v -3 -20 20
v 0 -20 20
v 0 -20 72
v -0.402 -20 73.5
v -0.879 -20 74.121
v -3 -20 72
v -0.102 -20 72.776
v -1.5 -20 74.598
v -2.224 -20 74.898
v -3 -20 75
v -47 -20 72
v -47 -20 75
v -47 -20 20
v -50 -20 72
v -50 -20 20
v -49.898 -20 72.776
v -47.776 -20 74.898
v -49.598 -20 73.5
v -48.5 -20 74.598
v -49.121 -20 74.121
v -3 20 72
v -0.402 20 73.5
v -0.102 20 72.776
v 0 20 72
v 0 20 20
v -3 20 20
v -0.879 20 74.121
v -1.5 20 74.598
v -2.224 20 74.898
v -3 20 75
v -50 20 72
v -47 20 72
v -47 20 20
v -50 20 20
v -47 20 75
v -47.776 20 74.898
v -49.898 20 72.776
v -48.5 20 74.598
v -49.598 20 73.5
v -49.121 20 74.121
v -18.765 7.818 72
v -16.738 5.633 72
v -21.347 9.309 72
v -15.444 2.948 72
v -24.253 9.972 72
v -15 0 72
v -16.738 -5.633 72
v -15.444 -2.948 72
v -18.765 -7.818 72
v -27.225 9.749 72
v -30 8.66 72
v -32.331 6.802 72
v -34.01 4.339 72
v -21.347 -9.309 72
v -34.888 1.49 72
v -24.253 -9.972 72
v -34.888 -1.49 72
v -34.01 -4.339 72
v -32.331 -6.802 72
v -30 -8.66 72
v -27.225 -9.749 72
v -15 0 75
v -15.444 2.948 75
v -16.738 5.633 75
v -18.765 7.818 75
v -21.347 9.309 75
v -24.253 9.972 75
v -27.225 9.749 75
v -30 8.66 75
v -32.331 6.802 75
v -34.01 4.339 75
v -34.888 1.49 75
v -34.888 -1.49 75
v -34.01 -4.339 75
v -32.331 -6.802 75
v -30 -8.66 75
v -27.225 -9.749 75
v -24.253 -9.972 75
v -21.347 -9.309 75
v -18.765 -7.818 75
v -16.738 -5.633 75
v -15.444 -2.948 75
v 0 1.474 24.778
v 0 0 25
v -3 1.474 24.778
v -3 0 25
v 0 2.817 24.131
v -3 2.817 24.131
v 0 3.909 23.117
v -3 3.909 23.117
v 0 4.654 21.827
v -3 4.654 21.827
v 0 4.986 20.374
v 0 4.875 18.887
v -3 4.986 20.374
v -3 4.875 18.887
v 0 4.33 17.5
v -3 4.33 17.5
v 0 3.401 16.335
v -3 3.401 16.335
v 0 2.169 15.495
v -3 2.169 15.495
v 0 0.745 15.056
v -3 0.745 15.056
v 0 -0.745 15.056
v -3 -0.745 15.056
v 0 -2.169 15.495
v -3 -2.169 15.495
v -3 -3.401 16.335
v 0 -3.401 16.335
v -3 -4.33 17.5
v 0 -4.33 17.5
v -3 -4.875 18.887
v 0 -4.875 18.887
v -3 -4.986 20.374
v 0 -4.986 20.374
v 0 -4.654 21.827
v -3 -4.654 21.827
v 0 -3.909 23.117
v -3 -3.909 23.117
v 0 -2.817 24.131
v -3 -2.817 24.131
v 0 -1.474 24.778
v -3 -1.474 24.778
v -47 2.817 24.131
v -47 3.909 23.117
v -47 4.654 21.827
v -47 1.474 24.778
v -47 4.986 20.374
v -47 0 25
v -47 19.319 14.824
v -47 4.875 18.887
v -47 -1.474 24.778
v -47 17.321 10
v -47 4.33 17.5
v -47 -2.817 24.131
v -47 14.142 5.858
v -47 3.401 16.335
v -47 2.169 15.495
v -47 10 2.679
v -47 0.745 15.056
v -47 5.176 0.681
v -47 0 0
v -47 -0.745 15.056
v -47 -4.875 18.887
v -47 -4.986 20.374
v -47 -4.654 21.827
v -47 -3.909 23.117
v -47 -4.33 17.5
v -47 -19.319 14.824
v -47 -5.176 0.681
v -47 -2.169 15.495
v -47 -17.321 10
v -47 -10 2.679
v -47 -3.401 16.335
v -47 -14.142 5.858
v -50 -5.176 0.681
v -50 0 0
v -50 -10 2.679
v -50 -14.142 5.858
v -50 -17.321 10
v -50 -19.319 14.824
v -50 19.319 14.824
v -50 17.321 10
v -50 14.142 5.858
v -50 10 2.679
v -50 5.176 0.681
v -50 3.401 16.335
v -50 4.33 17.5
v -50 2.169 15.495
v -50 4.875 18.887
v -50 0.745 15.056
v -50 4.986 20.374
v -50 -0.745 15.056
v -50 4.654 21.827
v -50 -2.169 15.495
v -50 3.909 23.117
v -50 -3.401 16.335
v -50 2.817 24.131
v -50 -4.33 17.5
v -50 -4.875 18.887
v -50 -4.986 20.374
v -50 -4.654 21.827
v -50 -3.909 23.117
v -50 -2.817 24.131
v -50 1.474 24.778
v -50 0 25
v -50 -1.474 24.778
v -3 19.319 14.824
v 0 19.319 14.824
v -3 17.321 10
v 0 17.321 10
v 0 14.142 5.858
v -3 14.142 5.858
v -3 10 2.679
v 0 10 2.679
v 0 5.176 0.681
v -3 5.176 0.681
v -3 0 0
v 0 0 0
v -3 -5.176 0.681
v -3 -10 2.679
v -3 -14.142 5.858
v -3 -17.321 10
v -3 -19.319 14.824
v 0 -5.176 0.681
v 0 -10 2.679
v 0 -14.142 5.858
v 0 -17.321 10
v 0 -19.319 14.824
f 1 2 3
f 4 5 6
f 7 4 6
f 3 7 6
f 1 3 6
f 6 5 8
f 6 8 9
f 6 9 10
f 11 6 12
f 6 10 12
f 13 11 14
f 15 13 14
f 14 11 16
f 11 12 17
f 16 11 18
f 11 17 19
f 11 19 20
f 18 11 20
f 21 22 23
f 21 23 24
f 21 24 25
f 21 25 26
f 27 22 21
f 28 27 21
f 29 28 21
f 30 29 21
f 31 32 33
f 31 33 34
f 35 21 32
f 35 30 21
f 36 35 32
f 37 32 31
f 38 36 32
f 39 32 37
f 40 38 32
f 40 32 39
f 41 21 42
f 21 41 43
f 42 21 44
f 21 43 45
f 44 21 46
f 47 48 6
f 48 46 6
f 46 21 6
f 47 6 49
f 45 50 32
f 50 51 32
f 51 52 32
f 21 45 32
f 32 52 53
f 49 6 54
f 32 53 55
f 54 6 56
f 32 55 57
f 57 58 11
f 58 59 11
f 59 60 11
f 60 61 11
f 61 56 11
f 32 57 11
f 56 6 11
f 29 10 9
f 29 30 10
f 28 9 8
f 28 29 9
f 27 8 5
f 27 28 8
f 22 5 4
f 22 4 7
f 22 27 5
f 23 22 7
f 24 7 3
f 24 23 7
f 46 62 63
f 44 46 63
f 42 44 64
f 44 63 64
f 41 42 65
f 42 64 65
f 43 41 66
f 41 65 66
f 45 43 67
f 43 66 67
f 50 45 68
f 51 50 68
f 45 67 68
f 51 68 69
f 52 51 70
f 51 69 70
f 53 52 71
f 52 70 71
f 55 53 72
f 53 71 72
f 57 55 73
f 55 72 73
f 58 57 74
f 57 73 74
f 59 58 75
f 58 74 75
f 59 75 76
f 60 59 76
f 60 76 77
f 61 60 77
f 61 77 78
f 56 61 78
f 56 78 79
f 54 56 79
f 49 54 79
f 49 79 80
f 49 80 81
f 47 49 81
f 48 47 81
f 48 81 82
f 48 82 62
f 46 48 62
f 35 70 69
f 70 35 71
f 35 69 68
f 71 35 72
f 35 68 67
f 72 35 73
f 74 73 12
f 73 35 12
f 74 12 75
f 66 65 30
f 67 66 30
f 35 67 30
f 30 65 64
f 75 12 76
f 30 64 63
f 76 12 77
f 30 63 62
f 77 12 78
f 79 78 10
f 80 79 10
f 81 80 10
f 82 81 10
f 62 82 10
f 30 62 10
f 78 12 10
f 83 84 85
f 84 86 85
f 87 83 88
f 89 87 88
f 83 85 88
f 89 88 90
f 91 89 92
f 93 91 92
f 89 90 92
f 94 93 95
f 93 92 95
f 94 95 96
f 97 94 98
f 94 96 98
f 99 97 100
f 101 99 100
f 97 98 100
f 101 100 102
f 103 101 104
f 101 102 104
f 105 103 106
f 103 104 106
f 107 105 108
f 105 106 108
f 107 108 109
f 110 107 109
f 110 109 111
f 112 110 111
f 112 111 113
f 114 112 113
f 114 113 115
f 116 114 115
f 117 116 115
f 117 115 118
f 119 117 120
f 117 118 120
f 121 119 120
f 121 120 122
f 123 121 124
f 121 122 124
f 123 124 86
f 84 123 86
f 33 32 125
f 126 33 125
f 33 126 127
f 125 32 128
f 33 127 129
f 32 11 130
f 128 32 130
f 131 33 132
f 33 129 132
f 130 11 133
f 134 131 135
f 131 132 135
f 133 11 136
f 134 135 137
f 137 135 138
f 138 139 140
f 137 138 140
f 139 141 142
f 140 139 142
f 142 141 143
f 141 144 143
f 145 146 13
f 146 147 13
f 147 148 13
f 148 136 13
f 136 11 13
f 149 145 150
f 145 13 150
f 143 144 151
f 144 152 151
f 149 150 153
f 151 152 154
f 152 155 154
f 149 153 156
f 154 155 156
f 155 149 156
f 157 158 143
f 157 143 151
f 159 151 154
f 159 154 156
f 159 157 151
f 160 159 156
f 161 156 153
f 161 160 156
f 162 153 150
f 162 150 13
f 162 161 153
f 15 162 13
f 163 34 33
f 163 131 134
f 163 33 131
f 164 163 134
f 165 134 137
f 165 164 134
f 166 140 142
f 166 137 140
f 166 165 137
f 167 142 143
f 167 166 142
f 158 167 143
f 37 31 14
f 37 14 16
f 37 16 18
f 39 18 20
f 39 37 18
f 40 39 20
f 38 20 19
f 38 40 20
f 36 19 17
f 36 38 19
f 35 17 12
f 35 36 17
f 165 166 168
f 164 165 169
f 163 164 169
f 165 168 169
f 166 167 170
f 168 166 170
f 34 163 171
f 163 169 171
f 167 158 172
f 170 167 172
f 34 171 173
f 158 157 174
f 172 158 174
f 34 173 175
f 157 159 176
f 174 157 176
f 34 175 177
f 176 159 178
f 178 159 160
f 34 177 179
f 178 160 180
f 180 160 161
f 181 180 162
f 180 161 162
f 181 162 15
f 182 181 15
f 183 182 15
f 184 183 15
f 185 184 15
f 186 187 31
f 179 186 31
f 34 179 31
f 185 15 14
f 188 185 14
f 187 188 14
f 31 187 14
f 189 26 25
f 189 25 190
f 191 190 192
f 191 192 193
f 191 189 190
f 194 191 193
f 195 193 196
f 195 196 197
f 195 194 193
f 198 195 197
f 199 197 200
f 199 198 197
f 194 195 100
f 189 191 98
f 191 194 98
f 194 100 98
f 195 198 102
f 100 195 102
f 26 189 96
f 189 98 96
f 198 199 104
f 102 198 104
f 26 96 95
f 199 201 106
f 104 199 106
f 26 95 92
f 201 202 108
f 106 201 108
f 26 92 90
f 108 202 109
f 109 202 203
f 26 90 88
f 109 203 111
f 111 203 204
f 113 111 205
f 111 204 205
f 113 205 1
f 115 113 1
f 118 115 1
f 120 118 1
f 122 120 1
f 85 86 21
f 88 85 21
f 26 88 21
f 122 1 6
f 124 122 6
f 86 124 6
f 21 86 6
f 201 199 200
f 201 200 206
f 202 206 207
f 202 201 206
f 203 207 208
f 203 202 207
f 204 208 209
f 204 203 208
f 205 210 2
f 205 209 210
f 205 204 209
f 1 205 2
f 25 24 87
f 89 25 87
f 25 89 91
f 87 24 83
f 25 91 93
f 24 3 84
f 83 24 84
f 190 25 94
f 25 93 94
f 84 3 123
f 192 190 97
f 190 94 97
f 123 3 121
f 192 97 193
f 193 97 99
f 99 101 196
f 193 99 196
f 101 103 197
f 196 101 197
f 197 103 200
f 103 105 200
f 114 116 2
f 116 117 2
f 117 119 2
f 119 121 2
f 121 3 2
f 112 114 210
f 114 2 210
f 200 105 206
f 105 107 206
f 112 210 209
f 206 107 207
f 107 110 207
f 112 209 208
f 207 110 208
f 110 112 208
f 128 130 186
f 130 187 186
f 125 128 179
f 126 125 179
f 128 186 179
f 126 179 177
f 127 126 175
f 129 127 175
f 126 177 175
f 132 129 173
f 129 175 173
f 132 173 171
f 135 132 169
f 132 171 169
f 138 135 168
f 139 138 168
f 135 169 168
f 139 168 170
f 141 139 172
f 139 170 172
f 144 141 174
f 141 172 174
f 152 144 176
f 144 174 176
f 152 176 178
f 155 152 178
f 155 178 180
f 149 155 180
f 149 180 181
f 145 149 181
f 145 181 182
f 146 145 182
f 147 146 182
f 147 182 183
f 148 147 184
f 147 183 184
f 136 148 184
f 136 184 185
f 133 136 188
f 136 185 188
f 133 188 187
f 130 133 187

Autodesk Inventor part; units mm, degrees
ref_plane "YZ Plane" through (0, 0, 0) normal (1, 0, 0) x (0, 1, 0)
ref_plane "XZ Plane" through (0, 0, 0) normal (0, 1, 0) x (-1, 0, 0)
ref_plane "XY Plane" through (0, 0, 0) normal (0, 0, 1) x (1, 0, 0)
sketch "Sketch1" plane through (0, 0, 0) normal (0, 1, 0) x (-1, 0, 0)
  line L0 (50, 0) -> (50, 75)
  line L1 (50, 75) -> (0, 75)
  line L2 (0, 75) -> (0, 0)
  line L3 (3, 0) -> (3, 72)
  line L4 (3, 72) -> (47, 72)
  line L5 (47, 72) -> (47, 0)
  line L6 (0, 0) -> (3, 0)
  line L7 (47, 0) -> (50, 0)
  dimension "d0" = 50
  dimension "d1" = 75
  dimension "d2" = 3
extrude "Extrusion1" add sketch "Sketch1" along normal mid plane 40
fillet "Fillet1" radius 20 4 edges at (-48.5, 20, 0) (-48.5, -20, 0) (-1.5, 20, 0) (-1.5, -20, 0)
fillet "Fillet2" radius 3 2 edges at (-50, 0, 75) (0, 0, 75)
sketch "Sketch2" plane through (-50, 0, 20) normal (-1, 0, 0) x (0, 0, 1)
  circle A0 centre (0, 0) radius 5
  point P0 (-20, 0)
  dimension "d7" = 10
extrude "Extrusion2" cut sketch "Sketch2" against normal through all
sketch "Sketch3" plane through (-47, 20, 75) normal (0, 0, 1) x (1, 0, 0)
  circle A0 centre (22, -20) radius 10
  point P0 (47, -20)
  dimension "d10" = 20
extrude "Extrusion3" cut sketch "Sketch3" against normal blind 10
